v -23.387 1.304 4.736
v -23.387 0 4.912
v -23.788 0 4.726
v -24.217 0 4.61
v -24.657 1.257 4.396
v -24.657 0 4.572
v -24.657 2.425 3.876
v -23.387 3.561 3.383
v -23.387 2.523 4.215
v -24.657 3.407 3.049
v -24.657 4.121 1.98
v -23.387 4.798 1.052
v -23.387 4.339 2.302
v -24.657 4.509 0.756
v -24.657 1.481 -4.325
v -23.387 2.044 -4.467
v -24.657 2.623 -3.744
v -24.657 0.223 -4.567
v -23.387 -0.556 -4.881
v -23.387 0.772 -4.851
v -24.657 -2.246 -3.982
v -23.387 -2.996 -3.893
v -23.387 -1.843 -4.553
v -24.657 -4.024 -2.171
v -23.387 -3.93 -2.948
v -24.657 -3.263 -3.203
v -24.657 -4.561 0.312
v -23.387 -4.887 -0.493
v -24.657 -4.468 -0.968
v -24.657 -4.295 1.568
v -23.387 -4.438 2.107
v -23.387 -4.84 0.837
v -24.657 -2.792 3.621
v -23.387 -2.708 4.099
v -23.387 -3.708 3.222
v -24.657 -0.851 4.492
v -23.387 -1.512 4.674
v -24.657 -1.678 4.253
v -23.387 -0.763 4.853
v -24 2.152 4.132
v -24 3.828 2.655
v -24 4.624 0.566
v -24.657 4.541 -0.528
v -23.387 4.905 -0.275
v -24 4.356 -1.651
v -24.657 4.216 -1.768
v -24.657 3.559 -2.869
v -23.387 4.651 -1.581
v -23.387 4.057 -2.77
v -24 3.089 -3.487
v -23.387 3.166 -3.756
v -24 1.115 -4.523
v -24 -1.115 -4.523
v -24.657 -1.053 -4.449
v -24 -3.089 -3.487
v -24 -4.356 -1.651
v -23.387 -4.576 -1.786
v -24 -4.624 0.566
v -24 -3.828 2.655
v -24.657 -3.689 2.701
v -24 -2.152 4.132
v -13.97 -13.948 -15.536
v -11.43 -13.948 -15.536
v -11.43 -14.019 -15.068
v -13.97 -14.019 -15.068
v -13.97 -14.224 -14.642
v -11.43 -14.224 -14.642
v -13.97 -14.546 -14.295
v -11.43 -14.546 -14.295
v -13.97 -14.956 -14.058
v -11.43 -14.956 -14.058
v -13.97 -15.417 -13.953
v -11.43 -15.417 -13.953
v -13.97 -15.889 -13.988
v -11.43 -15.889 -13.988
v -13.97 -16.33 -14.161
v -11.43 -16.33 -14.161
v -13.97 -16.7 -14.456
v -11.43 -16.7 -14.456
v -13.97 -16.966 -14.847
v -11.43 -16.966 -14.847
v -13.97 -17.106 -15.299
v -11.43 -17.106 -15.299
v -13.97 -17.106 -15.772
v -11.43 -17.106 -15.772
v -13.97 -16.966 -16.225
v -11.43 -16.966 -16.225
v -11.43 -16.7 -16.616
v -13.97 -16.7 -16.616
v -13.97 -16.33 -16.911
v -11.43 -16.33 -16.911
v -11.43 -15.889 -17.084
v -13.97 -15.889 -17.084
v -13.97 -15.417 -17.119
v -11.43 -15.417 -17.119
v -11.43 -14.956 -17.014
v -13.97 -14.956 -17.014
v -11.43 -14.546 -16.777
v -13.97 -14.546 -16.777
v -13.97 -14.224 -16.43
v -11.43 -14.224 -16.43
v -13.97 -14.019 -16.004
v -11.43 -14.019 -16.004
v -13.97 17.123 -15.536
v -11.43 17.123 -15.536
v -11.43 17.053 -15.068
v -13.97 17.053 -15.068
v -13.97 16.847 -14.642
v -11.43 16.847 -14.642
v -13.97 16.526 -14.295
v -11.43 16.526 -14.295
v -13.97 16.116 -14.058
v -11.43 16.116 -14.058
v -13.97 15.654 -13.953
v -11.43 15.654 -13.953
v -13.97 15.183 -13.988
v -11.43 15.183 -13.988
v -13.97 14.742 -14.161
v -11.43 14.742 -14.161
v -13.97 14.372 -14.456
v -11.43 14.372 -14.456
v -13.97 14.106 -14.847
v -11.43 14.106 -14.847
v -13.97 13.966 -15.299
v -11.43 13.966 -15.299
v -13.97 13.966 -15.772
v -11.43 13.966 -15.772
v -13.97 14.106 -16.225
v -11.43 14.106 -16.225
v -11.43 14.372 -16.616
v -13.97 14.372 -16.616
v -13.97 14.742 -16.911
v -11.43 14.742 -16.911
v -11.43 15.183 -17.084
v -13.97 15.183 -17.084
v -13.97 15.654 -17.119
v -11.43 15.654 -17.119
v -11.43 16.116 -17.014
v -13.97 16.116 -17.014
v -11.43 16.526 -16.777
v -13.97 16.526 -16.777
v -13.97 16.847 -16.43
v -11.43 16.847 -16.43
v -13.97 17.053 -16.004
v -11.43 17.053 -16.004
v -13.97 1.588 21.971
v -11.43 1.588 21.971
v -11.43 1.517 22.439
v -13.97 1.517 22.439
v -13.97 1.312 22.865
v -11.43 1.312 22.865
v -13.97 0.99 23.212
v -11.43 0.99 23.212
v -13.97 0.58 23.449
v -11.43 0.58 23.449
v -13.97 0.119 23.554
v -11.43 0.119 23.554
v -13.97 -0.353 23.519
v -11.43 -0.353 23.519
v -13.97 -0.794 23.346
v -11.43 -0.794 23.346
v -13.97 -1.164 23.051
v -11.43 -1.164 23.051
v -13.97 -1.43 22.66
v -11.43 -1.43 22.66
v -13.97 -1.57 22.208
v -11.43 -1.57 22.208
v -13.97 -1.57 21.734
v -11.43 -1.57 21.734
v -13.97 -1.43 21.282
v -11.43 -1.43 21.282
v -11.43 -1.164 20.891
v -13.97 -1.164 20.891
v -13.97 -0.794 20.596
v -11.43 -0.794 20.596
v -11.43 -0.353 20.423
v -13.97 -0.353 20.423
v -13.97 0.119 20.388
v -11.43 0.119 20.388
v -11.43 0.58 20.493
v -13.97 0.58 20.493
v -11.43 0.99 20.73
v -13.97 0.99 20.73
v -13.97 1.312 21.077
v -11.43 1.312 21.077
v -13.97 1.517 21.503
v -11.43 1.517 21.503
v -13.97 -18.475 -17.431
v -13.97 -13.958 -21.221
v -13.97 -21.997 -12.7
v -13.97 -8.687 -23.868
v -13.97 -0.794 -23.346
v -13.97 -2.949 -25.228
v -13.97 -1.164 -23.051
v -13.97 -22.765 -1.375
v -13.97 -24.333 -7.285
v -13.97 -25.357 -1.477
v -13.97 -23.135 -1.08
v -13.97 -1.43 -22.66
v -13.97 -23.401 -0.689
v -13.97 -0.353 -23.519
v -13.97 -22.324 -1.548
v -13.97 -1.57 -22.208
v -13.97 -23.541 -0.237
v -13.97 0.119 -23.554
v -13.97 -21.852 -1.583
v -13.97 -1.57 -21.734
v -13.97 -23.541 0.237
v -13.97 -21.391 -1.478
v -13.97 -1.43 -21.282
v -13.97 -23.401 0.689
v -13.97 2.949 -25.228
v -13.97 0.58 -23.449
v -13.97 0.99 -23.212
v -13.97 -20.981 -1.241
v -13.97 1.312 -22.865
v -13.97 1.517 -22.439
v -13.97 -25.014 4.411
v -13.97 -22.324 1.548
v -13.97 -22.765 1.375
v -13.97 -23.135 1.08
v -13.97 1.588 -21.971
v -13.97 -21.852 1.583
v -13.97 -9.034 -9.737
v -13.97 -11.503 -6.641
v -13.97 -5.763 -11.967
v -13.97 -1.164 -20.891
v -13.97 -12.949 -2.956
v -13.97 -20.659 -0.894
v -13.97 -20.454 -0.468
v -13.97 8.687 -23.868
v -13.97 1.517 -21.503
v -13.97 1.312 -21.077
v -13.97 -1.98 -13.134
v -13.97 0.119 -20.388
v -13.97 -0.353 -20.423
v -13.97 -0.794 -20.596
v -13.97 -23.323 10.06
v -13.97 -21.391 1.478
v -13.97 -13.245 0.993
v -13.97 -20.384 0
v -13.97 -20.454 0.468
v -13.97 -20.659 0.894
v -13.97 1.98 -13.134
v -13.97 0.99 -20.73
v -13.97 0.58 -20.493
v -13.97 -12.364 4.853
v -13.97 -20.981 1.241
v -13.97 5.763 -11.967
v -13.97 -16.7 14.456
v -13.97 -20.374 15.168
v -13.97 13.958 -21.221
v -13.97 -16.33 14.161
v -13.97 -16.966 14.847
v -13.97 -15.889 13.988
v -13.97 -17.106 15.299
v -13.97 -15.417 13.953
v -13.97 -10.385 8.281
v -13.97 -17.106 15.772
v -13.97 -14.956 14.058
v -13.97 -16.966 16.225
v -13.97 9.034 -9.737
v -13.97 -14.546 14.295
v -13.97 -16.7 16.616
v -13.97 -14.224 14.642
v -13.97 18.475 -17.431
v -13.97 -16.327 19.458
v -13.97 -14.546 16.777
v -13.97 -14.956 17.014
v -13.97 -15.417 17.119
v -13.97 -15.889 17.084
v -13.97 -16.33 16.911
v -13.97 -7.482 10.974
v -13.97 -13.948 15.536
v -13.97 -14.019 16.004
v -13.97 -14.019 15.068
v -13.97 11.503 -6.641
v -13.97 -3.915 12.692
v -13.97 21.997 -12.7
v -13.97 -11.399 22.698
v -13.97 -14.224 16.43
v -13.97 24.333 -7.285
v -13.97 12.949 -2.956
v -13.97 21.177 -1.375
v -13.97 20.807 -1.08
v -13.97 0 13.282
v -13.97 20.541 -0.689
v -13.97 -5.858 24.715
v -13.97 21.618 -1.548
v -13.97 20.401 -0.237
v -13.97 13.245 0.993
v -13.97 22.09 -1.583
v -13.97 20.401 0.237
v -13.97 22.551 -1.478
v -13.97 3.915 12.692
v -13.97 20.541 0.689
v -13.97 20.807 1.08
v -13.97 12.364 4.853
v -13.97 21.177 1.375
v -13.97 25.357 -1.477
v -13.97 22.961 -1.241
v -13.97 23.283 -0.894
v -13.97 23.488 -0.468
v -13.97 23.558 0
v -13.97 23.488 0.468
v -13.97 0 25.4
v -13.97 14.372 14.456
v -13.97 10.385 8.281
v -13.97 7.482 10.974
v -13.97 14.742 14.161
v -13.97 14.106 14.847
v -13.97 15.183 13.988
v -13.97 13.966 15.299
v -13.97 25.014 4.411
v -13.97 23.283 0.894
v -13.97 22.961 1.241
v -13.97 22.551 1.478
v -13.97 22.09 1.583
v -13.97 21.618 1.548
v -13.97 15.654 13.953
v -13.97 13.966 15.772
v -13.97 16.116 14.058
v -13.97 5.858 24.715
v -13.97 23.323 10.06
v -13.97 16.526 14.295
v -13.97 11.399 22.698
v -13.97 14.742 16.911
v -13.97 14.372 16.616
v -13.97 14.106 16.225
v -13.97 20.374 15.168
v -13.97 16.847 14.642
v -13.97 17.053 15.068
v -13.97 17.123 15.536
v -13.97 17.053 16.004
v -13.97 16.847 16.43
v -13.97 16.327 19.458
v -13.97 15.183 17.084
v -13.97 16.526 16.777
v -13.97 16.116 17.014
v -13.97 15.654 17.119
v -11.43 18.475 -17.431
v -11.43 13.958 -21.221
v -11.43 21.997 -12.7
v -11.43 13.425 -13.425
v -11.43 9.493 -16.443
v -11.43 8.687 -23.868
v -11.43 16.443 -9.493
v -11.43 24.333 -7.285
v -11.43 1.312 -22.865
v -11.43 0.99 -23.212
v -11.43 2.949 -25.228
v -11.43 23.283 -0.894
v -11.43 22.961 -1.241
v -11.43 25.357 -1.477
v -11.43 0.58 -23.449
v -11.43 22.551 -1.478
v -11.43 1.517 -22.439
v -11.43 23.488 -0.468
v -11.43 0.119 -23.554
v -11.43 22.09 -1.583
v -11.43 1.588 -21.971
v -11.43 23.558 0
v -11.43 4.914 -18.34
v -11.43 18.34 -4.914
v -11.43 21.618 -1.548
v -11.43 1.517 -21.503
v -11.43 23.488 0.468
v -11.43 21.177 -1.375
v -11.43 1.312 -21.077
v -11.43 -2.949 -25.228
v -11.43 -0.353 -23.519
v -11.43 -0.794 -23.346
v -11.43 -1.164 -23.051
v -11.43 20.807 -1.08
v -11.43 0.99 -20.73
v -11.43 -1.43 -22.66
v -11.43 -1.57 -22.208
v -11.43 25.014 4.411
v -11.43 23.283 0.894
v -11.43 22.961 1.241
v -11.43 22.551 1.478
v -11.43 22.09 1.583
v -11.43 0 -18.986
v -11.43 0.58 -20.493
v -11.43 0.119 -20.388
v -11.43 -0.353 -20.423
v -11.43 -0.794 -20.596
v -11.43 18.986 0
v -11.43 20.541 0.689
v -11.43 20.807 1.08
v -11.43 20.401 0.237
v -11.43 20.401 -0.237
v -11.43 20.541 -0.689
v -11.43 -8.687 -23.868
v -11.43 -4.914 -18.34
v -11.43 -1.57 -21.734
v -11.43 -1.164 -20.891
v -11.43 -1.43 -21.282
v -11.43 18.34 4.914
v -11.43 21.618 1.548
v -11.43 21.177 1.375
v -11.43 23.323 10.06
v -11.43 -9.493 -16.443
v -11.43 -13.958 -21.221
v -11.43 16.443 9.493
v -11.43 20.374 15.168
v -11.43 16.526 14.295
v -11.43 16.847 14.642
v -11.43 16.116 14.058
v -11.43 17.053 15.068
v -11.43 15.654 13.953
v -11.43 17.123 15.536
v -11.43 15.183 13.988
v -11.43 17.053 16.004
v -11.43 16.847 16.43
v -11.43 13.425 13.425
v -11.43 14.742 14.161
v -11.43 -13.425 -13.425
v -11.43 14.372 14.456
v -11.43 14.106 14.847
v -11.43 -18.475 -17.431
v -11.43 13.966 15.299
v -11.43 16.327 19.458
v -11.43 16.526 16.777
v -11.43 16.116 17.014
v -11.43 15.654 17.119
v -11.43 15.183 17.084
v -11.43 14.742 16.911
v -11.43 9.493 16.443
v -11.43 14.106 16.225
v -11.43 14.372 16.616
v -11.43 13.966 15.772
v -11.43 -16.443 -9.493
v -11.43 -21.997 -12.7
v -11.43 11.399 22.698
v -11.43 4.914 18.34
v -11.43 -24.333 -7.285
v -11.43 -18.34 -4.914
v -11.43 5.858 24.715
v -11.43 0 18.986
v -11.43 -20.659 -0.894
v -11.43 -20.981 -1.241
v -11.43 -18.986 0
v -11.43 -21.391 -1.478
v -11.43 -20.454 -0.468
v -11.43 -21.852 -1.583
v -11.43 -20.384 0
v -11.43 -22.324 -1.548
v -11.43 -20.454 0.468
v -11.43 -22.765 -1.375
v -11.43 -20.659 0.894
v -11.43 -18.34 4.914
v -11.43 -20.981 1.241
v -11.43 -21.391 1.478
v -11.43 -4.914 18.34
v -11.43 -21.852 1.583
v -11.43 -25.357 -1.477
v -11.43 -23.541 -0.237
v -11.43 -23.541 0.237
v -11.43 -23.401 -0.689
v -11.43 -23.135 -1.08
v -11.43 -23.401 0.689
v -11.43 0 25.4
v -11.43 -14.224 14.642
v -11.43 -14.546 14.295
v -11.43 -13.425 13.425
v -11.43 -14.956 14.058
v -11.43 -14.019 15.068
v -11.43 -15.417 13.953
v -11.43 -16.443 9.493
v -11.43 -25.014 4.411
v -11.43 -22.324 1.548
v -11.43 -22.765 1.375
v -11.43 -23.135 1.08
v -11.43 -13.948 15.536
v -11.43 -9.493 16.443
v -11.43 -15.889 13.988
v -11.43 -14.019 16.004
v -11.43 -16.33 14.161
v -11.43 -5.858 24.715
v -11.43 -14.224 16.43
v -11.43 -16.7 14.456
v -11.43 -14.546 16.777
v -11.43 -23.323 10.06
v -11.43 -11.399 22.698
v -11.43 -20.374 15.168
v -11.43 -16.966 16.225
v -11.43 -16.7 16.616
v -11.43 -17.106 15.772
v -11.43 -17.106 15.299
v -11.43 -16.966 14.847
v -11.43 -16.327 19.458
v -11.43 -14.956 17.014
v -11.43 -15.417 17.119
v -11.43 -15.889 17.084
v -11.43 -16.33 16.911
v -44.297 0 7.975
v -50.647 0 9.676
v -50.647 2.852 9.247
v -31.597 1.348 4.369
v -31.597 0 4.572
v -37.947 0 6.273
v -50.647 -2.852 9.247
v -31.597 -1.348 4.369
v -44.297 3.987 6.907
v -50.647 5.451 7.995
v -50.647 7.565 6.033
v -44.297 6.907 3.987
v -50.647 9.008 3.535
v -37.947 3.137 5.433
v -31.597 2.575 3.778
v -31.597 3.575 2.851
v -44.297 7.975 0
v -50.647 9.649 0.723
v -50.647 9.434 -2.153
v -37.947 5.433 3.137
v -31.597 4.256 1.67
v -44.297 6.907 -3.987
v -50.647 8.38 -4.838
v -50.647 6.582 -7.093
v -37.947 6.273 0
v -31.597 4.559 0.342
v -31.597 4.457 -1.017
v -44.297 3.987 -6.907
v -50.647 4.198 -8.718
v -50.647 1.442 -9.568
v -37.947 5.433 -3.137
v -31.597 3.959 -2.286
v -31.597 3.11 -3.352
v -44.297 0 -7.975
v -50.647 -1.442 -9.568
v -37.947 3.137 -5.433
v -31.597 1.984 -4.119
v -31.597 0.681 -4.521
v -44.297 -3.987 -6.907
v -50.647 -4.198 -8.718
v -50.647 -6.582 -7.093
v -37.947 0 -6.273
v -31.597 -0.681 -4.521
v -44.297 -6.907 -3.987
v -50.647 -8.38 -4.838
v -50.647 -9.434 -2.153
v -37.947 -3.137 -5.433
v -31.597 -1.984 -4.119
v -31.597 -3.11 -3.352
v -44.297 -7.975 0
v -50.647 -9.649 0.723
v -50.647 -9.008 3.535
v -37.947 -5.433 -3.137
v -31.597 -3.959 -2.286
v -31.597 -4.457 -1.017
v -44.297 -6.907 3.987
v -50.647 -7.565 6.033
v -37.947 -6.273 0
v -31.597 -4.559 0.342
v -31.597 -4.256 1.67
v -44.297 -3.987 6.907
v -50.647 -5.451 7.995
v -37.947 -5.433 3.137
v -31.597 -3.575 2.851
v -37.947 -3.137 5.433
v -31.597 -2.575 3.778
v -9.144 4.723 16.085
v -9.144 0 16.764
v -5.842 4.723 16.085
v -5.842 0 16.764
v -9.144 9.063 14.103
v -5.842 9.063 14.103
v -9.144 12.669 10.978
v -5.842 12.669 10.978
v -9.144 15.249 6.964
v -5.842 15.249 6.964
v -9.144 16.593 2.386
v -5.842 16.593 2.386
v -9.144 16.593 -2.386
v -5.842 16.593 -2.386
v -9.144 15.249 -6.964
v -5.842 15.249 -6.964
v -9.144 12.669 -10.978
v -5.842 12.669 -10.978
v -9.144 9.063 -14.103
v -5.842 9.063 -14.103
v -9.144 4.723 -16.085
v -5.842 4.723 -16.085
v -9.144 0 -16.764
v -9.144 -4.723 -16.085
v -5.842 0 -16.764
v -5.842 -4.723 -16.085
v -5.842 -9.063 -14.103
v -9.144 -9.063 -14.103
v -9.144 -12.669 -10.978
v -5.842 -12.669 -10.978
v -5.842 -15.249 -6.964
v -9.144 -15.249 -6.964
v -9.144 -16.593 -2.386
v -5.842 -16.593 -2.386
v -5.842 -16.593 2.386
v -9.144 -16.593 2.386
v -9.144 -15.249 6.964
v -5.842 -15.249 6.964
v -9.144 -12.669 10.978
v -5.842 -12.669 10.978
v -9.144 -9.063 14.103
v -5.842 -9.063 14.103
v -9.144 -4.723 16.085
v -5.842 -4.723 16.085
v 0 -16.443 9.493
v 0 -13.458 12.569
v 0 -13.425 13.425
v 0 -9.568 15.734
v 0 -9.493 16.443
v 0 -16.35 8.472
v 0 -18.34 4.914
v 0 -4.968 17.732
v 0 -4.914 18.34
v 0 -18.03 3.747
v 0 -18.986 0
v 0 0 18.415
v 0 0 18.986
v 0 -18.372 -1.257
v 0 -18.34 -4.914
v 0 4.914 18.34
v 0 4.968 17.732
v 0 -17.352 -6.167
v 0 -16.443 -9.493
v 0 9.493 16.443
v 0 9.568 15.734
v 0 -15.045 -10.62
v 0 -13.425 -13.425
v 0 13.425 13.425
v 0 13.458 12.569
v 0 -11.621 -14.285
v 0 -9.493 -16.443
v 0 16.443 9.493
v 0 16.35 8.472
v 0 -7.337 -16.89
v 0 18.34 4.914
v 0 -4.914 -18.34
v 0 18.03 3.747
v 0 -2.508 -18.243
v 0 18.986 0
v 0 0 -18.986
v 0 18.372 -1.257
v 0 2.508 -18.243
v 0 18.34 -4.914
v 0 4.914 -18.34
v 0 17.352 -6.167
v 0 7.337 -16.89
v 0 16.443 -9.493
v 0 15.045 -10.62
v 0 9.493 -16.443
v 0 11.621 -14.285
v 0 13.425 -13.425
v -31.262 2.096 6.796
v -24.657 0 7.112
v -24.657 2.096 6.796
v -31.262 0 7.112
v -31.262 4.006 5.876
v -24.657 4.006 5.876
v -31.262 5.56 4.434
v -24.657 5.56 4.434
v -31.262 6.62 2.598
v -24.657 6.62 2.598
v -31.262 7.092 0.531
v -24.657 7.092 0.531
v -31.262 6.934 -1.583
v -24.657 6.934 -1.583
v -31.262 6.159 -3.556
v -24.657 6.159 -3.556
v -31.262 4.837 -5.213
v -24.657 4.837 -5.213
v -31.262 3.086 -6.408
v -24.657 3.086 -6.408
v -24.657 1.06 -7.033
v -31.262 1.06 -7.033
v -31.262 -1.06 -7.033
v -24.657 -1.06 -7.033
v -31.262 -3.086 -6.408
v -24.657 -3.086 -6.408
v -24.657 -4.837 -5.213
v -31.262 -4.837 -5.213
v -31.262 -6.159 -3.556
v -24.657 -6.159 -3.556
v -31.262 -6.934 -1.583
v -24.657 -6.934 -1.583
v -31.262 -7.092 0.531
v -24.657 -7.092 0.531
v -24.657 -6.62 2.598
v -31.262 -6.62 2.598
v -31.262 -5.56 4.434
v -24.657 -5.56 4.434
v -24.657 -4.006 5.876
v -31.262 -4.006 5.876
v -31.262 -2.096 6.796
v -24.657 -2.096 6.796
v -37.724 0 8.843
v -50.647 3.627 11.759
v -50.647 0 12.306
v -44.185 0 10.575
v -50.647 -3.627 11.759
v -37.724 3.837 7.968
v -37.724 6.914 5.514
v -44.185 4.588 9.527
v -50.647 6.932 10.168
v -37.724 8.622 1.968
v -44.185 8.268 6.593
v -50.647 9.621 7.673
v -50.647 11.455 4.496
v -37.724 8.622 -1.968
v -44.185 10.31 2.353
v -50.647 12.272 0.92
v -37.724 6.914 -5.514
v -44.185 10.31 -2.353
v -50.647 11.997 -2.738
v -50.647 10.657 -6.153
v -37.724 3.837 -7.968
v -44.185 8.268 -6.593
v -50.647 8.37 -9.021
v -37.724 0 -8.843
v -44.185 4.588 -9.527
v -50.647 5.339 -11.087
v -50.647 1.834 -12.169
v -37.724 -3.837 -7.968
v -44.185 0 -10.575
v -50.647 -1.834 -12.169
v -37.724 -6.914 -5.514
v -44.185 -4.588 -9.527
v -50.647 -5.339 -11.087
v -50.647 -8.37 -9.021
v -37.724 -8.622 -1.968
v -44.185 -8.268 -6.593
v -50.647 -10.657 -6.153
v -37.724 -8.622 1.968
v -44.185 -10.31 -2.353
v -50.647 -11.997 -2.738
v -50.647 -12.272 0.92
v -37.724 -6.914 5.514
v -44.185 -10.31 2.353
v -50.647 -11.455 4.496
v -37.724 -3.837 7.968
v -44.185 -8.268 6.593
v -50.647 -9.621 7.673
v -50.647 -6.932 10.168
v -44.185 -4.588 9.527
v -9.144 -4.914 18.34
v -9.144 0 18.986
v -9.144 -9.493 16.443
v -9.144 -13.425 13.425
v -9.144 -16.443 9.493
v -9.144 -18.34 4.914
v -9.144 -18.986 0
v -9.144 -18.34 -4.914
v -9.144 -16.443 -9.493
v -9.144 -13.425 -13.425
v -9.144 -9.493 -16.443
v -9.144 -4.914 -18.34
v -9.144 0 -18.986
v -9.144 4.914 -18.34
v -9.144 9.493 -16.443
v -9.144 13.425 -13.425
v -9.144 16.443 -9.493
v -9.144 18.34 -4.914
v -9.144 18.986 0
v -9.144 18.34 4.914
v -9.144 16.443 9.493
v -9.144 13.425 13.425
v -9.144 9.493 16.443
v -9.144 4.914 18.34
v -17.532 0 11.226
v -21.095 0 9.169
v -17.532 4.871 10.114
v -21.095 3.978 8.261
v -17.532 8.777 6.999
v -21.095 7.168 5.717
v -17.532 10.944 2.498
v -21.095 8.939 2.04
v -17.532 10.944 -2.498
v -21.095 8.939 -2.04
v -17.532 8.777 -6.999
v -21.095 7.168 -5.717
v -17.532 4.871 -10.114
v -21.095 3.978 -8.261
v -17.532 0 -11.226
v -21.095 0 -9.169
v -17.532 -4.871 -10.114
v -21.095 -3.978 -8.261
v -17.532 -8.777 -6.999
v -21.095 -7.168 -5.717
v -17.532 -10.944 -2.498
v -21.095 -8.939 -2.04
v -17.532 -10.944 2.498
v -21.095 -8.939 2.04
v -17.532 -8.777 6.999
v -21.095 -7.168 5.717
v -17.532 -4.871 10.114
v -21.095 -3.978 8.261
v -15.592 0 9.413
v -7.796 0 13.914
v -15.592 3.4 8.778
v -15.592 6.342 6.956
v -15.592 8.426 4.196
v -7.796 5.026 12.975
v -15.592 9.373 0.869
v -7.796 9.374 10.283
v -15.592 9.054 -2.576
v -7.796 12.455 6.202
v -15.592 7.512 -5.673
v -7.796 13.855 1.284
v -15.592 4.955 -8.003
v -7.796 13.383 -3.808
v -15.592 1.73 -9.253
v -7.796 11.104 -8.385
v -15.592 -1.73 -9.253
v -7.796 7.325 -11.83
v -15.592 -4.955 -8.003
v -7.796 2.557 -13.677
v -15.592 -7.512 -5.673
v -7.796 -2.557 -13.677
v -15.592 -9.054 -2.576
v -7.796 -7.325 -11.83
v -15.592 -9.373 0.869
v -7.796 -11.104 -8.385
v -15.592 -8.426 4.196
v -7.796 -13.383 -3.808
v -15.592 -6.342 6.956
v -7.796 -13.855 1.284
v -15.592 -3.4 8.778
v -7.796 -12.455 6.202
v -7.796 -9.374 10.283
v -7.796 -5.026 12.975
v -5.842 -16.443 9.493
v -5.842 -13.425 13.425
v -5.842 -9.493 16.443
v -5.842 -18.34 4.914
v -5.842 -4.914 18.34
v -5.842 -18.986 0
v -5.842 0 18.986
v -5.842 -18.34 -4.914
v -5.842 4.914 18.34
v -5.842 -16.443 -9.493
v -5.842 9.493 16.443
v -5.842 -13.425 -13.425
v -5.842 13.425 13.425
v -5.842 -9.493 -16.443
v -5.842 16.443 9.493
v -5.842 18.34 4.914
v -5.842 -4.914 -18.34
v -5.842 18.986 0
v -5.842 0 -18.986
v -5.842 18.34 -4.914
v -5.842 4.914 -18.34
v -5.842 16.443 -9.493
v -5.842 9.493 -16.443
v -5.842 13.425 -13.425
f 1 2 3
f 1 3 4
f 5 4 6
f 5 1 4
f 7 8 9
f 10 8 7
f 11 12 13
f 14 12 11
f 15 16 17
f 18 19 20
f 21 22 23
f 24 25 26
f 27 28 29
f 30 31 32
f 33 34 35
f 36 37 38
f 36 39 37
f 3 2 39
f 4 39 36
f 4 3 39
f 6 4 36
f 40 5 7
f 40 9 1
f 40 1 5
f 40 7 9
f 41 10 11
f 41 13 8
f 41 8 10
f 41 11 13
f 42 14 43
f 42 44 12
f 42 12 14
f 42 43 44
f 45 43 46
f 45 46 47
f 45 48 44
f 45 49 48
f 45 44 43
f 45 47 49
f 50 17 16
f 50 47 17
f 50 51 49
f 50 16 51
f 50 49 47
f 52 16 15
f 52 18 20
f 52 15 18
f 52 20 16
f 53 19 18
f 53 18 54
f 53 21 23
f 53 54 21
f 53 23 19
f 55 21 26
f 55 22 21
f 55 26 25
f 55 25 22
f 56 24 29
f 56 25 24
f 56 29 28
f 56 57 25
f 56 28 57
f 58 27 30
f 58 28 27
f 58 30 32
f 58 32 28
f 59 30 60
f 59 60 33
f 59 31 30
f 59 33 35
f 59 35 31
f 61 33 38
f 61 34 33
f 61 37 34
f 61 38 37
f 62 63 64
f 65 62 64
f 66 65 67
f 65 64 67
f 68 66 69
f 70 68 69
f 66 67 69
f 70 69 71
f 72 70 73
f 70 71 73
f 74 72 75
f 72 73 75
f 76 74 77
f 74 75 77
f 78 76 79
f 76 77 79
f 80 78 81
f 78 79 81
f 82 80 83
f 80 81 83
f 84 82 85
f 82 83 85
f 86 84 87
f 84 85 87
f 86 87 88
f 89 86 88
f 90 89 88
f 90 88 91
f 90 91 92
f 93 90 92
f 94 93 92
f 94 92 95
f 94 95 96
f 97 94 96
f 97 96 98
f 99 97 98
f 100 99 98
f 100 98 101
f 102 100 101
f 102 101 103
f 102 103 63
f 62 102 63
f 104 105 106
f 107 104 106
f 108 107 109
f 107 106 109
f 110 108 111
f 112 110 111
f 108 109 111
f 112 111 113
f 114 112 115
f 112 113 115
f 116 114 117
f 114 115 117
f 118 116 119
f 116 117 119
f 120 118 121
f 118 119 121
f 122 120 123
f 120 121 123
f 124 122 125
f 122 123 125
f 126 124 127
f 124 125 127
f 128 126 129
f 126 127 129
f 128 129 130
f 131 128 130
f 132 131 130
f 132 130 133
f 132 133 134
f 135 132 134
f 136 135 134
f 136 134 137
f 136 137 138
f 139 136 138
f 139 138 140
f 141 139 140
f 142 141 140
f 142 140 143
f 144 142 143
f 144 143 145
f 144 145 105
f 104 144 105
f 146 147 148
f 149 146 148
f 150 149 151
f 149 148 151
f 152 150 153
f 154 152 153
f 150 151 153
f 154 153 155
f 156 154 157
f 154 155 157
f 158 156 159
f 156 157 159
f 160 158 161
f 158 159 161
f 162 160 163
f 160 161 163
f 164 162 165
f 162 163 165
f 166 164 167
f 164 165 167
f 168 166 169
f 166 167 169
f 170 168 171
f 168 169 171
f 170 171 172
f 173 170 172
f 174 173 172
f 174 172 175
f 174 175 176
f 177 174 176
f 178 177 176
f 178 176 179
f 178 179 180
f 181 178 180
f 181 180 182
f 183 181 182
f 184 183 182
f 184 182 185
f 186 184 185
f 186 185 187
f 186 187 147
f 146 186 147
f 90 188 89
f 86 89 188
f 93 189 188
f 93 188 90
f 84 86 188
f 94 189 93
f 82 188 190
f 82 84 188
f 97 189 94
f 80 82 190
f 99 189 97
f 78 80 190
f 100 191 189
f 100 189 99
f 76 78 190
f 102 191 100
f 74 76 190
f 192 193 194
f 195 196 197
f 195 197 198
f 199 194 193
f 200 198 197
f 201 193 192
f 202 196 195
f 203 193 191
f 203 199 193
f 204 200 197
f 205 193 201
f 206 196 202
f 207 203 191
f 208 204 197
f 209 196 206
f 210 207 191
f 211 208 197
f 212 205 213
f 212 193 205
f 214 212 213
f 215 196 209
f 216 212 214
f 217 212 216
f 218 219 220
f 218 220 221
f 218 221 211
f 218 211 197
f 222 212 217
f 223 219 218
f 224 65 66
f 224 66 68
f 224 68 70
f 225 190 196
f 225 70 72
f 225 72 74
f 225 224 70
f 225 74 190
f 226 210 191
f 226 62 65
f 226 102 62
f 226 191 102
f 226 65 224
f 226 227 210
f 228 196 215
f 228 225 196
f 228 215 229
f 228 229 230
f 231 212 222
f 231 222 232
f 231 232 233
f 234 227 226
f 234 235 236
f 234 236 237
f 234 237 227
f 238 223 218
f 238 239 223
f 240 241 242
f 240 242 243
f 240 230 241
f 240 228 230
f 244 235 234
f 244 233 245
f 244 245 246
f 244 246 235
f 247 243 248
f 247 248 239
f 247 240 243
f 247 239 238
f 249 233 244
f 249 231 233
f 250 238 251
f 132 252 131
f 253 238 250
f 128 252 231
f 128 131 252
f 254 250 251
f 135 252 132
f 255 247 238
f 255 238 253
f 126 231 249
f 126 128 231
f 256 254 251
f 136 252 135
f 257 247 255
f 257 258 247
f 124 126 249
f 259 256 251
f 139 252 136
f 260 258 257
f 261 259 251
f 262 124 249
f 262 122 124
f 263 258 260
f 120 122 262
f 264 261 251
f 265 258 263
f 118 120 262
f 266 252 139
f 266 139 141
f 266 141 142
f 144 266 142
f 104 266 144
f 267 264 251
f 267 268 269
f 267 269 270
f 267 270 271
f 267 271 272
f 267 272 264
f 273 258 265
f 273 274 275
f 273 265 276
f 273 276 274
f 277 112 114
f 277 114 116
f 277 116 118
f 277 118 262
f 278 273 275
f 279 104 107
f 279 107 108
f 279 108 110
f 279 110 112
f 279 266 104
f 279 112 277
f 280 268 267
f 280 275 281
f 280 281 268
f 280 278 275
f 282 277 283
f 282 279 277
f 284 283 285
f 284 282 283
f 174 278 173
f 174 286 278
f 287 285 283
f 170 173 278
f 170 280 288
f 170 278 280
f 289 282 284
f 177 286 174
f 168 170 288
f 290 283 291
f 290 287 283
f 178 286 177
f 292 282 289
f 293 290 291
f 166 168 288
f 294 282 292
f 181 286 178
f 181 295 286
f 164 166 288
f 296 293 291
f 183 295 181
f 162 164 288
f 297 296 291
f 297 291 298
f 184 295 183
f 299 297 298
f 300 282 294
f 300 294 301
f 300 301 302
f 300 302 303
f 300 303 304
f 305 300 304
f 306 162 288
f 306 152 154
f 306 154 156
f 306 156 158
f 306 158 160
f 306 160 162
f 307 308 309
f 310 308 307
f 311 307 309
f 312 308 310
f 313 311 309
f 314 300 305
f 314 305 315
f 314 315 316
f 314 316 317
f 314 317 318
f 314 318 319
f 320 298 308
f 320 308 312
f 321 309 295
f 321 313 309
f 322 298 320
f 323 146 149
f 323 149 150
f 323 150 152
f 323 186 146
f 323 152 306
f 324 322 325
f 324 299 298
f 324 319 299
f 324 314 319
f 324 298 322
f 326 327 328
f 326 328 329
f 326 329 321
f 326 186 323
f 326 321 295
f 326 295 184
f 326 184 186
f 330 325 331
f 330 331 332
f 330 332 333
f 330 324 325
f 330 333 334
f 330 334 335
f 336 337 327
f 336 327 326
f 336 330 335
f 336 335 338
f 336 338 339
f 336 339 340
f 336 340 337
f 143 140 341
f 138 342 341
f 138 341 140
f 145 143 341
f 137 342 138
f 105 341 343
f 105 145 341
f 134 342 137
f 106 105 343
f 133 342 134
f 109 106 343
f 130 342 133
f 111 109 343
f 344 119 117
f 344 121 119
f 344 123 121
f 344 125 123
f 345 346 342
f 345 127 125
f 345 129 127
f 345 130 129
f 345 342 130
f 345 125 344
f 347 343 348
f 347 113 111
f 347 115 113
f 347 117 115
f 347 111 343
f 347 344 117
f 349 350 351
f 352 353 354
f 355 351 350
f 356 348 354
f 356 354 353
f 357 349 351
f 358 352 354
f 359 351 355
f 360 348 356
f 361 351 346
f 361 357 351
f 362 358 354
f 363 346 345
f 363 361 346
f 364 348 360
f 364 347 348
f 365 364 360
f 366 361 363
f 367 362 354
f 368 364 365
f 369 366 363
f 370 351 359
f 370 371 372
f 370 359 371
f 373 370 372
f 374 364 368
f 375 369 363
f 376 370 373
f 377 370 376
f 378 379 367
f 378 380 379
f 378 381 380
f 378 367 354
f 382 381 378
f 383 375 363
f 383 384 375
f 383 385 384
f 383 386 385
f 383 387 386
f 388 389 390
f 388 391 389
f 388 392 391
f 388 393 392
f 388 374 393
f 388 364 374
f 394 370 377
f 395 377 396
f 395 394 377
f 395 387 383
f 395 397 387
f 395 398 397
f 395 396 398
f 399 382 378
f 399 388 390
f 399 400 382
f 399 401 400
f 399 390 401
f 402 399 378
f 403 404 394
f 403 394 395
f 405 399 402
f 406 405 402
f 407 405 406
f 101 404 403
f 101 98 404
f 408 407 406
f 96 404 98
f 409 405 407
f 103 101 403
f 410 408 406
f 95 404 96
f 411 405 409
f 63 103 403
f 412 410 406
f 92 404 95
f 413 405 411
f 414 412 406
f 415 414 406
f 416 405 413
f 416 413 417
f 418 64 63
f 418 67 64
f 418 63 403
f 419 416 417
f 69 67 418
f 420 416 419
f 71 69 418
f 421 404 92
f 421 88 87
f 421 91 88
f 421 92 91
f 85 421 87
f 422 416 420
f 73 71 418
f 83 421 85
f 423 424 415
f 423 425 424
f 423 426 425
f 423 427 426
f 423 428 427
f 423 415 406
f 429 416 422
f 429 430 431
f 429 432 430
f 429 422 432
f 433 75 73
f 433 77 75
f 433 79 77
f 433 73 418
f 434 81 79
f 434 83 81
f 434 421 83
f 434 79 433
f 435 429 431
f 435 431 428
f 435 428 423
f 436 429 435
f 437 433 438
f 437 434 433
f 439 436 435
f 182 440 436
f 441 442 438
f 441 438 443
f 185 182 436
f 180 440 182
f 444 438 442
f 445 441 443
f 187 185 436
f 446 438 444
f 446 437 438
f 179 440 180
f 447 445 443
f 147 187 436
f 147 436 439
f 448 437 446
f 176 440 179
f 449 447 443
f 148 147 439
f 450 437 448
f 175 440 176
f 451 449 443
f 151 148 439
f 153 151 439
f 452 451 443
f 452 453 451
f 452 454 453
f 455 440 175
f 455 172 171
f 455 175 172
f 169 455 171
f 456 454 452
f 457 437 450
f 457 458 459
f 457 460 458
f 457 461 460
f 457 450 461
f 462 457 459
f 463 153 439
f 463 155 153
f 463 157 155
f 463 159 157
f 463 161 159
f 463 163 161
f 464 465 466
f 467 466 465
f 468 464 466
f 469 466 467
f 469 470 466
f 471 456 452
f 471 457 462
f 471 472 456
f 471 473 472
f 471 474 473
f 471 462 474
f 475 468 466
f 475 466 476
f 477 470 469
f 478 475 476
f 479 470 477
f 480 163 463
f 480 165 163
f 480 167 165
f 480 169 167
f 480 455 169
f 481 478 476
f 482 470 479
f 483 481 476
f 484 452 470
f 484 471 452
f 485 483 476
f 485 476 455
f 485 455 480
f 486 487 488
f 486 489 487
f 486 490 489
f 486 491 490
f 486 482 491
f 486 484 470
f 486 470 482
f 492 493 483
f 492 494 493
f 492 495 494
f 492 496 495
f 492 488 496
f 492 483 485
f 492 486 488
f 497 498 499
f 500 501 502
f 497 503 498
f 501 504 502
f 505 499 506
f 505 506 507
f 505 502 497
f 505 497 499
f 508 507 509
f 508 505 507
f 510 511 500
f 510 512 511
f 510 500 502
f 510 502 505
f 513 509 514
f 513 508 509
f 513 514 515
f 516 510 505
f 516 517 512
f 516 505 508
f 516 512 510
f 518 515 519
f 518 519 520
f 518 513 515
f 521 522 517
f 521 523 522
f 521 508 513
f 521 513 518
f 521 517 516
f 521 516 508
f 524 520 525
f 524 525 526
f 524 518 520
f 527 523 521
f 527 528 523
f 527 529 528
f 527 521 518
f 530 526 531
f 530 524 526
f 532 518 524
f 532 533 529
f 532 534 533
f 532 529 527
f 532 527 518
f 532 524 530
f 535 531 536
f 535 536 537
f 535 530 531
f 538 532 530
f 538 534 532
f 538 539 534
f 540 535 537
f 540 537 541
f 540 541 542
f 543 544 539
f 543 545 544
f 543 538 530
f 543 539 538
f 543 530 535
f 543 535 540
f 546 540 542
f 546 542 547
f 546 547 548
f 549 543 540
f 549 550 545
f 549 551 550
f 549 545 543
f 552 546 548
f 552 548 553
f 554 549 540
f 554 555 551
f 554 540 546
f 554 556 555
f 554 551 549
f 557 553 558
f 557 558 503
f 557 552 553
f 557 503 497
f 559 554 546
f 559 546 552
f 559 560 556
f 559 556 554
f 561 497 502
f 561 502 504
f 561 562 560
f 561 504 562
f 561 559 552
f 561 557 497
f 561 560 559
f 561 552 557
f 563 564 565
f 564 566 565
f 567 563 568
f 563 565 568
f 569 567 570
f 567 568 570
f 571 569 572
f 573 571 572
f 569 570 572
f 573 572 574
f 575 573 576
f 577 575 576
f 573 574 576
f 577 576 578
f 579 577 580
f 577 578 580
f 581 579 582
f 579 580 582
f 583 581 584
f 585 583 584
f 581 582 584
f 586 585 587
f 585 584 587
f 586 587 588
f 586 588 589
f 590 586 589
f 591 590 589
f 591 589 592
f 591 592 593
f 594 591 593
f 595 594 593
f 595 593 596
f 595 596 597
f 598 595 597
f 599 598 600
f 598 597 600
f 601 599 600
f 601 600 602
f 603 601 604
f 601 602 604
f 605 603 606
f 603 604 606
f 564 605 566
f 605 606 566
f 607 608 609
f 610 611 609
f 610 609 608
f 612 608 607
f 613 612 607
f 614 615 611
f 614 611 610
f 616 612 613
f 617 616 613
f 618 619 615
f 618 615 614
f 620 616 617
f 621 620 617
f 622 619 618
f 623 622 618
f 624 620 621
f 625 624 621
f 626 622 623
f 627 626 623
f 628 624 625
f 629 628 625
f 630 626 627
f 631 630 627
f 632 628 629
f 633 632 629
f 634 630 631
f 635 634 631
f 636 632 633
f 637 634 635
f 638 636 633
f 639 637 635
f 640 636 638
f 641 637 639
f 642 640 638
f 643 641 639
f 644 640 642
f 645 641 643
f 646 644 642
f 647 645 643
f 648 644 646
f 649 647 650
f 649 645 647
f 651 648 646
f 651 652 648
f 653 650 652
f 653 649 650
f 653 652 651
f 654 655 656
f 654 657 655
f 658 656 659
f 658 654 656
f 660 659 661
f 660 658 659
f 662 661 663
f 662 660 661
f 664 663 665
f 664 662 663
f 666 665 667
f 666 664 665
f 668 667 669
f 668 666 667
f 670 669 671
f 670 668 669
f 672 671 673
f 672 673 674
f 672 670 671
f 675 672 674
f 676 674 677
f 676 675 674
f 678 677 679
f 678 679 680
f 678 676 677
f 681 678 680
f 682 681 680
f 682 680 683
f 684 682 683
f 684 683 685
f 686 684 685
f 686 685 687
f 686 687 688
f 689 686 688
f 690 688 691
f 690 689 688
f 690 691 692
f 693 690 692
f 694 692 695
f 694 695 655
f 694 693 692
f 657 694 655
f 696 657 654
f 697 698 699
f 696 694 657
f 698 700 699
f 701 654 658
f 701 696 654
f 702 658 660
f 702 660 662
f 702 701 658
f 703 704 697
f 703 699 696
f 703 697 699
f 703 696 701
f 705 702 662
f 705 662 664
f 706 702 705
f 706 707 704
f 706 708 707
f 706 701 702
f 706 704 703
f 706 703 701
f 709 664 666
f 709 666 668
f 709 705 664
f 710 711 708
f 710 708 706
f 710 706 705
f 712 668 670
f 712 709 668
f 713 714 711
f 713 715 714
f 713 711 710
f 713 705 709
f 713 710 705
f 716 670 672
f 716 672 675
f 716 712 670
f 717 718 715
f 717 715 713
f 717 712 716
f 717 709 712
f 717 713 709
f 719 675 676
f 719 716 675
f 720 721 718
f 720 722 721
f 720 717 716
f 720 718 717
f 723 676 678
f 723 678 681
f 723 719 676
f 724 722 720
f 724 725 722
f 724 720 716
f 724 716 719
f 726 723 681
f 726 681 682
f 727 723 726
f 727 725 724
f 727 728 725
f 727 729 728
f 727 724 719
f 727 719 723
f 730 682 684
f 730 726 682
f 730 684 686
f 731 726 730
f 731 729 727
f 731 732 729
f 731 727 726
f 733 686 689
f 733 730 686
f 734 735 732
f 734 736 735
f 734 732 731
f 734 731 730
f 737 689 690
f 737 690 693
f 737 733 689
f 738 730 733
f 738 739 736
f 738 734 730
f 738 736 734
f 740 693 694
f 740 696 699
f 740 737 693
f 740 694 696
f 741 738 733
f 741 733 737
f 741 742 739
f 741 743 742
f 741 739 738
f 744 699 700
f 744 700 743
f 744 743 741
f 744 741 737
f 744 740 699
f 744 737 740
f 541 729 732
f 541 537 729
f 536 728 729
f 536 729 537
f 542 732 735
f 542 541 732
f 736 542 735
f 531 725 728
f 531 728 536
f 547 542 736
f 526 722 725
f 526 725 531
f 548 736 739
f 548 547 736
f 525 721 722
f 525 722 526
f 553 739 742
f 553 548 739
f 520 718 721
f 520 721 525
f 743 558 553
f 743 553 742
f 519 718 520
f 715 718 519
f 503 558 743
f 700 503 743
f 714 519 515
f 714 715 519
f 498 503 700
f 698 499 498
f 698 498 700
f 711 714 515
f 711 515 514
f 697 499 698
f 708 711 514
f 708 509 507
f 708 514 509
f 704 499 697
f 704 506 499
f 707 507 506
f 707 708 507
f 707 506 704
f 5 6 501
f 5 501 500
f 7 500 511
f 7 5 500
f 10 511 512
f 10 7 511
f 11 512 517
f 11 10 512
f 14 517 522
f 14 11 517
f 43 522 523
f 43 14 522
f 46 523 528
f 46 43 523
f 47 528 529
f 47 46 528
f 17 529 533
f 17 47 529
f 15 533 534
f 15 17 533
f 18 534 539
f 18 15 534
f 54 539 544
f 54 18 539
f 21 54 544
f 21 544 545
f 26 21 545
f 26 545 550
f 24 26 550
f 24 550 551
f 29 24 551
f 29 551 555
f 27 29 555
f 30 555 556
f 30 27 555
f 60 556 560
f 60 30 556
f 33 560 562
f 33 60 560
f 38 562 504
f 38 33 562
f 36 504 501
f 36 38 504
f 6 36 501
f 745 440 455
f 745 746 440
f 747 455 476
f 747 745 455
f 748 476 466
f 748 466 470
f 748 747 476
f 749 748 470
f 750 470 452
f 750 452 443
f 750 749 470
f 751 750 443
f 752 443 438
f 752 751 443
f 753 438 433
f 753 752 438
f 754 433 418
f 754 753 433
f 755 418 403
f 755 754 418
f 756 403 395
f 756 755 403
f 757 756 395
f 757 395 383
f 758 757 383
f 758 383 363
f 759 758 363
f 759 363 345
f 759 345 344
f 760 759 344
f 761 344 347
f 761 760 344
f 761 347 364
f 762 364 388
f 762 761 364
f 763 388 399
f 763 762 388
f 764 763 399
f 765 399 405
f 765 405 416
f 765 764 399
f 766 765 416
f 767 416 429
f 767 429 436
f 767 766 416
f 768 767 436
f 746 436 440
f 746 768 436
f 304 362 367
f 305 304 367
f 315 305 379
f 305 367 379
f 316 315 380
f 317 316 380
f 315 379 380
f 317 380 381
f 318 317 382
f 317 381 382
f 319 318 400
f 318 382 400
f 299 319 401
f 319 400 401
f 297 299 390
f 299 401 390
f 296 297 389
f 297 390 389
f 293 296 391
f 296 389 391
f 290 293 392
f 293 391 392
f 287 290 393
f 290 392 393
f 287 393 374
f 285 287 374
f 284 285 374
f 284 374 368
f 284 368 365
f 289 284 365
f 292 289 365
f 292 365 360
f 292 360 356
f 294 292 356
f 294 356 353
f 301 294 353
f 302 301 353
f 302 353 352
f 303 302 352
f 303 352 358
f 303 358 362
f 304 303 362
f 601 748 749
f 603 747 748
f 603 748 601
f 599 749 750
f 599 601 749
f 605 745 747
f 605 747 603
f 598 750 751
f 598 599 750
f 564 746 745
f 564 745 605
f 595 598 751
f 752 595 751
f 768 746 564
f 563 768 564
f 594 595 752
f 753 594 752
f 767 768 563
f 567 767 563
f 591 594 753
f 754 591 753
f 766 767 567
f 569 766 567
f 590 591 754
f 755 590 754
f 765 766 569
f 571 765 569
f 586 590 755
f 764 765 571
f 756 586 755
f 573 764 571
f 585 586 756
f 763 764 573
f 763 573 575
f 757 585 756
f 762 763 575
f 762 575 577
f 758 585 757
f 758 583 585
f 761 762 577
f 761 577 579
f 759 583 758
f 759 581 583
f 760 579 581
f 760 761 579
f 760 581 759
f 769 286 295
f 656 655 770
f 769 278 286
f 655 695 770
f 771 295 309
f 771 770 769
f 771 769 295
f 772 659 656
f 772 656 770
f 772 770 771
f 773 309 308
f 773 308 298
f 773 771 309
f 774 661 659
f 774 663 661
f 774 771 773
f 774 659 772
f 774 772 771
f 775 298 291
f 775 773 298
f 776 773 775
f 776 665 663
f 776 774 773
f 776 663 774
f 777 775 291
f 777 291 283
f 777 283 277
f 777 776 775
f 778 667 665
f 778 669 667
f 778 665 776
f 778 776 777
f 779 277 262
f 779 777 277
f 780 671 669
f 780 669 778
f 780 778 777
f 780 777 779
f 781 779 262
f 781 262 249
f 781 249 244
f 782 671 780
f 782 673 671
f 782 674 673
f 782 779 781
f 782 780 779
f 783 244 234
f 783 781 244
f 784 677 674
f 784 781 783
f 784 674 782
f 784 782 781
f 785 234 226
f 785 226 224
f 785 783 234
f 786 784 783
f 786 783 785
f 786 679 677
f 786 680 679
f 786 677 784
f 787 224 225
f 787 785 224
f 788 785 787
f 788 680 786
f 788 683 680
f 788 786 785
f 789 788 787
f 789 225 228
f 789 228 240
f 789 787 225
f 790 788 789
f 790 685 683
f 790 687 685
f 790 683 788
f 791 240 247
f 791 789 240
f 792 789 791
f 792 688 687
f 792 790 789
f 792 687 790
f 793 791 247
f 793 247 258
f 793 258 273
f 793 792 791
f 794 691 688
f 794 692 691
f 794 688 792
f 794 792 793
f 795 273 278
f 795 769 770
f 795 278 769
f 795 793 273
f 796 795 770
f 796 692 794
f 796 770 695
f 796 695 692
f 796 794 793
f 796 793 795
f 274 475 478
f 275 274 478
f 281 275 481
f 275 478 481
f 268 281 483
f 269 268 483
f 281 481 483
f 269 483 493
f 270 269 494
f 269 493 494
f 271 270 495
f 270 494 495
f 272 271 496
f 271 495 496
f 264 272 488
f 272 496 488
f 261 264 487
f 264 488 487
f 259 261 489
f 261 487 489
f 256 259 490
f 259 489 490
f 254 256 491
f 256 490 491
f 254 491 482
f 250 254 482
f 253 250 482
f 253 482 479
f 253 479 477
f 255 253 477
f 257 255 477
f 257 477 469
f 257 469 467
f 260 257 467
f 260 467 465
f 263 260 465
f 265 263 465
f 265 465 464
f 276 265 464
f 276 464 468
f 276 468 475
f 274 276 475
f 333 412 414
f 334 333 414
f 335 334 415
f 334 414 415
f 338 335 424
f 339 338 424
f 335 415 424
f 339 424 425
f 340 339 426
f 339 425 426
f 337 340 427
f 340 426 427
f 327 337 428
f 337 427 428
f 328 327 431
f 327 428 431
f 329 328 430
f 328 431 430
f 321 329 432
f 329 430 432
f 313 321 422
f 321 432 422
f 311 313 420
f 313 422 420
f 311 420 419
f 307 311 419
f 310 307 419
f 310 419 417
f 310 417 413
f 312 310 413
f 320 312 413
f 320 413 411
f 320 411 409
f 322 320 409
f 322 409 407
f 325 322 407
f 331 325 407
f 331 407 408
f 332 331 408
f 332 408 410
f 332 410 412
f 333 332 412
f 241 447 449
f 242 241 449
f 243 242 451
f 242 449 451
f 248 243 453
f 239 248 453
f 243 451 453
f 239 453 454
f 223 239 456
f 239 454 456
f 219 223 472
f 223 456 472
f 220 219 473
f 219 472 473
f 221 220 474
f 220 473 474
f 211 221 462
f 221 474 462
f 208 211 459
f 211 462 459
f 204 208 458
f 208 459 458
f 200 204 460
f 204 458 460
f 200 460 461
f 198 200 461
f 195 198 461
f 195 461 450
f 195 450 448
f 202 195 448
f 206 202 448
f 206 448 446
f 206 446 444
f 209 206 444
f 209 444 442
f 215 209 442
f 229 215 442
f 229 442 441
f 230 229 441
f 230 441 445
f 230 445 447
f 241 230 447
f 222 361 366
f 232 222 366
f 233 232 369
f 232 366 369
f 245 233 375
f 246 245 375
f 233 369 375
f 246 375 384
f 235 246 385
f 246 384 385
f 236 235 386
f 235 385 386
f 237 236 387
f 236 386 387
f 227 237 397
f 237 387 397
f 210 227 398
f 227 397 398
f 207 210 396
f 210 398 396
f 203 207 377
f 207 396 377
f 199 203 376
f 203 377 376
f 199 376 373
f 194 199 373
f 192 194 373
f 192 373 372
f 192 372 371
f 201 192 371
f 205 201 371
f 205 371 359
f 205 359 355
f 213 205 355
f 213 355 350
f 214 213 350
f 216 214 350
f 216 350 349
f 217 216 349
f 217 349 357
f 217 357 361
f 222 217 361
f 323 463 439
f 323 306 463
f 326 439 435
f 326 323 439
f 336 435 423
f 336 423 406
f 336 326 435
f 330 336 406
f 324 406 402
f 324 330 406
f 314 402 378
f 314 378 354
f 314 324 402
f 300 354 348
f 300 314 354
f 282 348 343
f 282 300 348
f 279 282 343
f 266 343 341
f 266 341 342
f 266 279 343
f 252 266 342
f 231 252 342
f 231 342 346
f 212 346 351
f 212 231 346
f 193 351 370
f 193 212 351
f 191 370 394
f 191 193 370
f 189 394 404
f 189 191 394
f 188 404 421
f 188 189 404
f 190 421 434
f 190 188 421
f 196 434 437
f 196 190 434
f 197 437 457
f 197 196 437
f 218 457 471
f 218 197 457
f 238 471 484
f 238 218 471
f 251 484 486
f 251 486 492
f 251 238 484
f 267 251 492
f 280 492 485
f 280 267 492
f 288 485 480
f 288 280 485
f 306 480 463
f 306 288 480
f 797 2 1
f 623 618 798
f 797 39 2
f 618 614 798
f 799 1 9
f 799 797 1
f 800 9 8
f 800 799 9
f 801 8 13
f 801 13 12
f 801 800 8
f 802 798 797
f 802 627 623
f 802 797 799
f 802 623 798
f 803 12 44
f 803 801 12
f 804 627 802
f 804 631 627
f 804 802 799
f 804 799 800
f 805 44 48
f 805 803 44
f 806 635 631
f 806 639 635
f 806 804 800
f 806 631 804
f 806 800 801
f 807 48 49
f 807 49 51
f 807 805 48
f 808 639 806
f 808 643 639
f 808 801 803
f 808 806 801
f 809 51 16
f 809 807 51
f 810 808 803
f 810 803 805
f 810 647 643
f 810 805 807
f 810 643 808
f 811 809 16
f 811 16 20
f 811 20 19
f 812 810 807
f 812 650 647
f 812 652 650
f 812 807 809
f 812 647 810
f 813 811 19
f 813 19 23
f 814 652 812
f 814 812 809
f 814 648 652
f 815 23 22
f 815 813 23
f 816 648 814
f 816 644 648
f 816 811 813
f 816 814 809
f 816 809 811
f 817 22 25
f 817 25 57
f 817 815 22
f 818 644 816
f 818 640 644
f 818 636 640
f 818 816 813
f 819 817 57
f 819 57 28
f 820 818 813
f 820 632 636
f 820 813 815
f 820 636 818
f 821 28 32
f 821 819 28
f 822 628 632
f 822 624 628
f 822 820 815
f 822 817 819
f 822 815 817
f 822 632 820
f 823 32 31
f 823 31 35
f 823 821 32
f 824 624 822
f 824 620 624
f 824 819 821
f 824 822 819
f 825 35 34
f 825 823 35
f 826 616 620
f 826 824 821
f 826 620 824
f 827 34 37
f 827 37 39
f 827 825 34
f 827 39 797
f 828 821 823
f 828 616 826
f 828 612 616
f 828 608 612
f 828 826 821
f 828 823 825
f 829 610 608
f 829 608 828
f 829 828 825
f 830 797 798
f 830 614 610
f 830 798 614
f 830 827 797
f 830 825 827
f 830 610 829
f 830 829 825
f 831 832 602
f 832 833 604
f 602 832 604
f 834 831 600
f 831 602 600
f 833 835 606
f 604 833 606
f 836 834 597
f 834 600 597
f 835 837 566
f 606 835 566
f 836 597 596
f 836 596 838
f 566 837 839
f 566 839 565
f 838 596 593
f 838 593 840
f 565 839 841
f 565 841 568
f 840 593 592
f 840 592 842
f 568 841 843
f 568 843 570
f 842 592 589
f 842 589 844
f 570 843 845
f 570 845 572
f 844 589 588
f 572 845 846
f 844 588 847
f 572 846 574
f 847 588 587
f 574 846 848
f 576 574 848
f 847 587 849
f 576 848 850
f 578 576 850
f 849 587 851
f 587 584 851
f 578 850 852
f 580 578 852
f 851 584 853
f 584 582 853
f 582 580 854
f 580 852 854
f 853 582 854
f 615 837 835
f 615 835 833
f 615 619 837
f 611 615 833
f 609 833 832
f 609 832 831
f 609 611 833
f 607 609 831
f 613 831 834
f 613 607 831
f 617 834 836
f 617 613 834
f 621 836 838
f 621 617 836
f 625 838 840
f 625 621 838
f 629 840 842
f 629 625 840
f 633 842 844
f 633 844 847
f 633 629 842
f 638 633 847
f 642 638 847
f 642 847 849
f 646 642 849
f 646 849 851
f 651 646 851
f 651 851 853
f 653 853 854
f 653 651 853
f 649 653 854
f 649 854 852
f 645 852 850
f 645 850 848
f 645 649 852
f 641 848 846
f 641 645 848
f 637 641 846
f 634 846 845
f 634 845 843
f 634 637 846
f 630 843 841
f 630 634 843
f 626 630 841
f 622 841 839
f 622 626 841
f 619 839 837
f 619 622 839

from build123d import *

# Parameters (mm, degrees)
F2_R = 2.54
F5_W = 3.302
F5_H = 4.953003
F8_D = 3.175


with BuildPart() as f1:
    # F0 (on Front) → F1 (revolve)
    with BuildSketch(Plane.XZ):
        Polygon((-23.976779, 4.572), (0, 18.415), (0, 25.4), (-13.97, 25.4), (-13.97, 13.282356), (-24.65737, 7.112), (-31.262382, 7.112), (-50.646779, 12.306034), (-50.646779, 9.676432), (-31.596779, 4.572), align=None)
    revolve(axis=Axis((-17.938589, 0, 0), (-1, 0, 0)))

    # F2
    f2_edges = [f1.edges().sort_by_distance(p)[0] for p in [
        (-23.976779, 0, -4.572),
    ]]
    fillet(f2_edges, radius=F2_R)

    # F3 (on Front) → F4 (revolve, cut)
    with BuildSketch(Plane.XZ):
        Polygon((-11.43, 18.9865), (10.714284, 18.9865), (9.031125, 27.501298), (-11.43, 27.501298), align=None)
    revolve(axis=Axis((6.990795, 0, 0), (1, 0, 0)), mode=Mode.SUBTRACT)

    # F5 (on Front) → F6 (revolve, cut)
    with BuildSketch(Plane.XZ):
        with Locations((-7.493, 19.240502)):
            Rectangle(F5_W, F5_H)
    revolve(axis=Axis((-24.65737, 0, 0), (-1, 0, 0)), mode=Mode.SUBTRACT)

    # F8 (through all)
    with Locations(Plane(origin=(-13.97, 0, 0), x_dir=(0, -1, 0), z_dir=(-1, 0, 0))):
        with Locations((0, 21.971), (15.535843, 15.535843), (21.971, 0), (15.535843, -15.535843), (0, -21.971), (-15.535843, -15.535843), (-21.971, 0), (-15.535843, 15.535843)):
            Hole(F8_D / 2)


solid = f1.part
